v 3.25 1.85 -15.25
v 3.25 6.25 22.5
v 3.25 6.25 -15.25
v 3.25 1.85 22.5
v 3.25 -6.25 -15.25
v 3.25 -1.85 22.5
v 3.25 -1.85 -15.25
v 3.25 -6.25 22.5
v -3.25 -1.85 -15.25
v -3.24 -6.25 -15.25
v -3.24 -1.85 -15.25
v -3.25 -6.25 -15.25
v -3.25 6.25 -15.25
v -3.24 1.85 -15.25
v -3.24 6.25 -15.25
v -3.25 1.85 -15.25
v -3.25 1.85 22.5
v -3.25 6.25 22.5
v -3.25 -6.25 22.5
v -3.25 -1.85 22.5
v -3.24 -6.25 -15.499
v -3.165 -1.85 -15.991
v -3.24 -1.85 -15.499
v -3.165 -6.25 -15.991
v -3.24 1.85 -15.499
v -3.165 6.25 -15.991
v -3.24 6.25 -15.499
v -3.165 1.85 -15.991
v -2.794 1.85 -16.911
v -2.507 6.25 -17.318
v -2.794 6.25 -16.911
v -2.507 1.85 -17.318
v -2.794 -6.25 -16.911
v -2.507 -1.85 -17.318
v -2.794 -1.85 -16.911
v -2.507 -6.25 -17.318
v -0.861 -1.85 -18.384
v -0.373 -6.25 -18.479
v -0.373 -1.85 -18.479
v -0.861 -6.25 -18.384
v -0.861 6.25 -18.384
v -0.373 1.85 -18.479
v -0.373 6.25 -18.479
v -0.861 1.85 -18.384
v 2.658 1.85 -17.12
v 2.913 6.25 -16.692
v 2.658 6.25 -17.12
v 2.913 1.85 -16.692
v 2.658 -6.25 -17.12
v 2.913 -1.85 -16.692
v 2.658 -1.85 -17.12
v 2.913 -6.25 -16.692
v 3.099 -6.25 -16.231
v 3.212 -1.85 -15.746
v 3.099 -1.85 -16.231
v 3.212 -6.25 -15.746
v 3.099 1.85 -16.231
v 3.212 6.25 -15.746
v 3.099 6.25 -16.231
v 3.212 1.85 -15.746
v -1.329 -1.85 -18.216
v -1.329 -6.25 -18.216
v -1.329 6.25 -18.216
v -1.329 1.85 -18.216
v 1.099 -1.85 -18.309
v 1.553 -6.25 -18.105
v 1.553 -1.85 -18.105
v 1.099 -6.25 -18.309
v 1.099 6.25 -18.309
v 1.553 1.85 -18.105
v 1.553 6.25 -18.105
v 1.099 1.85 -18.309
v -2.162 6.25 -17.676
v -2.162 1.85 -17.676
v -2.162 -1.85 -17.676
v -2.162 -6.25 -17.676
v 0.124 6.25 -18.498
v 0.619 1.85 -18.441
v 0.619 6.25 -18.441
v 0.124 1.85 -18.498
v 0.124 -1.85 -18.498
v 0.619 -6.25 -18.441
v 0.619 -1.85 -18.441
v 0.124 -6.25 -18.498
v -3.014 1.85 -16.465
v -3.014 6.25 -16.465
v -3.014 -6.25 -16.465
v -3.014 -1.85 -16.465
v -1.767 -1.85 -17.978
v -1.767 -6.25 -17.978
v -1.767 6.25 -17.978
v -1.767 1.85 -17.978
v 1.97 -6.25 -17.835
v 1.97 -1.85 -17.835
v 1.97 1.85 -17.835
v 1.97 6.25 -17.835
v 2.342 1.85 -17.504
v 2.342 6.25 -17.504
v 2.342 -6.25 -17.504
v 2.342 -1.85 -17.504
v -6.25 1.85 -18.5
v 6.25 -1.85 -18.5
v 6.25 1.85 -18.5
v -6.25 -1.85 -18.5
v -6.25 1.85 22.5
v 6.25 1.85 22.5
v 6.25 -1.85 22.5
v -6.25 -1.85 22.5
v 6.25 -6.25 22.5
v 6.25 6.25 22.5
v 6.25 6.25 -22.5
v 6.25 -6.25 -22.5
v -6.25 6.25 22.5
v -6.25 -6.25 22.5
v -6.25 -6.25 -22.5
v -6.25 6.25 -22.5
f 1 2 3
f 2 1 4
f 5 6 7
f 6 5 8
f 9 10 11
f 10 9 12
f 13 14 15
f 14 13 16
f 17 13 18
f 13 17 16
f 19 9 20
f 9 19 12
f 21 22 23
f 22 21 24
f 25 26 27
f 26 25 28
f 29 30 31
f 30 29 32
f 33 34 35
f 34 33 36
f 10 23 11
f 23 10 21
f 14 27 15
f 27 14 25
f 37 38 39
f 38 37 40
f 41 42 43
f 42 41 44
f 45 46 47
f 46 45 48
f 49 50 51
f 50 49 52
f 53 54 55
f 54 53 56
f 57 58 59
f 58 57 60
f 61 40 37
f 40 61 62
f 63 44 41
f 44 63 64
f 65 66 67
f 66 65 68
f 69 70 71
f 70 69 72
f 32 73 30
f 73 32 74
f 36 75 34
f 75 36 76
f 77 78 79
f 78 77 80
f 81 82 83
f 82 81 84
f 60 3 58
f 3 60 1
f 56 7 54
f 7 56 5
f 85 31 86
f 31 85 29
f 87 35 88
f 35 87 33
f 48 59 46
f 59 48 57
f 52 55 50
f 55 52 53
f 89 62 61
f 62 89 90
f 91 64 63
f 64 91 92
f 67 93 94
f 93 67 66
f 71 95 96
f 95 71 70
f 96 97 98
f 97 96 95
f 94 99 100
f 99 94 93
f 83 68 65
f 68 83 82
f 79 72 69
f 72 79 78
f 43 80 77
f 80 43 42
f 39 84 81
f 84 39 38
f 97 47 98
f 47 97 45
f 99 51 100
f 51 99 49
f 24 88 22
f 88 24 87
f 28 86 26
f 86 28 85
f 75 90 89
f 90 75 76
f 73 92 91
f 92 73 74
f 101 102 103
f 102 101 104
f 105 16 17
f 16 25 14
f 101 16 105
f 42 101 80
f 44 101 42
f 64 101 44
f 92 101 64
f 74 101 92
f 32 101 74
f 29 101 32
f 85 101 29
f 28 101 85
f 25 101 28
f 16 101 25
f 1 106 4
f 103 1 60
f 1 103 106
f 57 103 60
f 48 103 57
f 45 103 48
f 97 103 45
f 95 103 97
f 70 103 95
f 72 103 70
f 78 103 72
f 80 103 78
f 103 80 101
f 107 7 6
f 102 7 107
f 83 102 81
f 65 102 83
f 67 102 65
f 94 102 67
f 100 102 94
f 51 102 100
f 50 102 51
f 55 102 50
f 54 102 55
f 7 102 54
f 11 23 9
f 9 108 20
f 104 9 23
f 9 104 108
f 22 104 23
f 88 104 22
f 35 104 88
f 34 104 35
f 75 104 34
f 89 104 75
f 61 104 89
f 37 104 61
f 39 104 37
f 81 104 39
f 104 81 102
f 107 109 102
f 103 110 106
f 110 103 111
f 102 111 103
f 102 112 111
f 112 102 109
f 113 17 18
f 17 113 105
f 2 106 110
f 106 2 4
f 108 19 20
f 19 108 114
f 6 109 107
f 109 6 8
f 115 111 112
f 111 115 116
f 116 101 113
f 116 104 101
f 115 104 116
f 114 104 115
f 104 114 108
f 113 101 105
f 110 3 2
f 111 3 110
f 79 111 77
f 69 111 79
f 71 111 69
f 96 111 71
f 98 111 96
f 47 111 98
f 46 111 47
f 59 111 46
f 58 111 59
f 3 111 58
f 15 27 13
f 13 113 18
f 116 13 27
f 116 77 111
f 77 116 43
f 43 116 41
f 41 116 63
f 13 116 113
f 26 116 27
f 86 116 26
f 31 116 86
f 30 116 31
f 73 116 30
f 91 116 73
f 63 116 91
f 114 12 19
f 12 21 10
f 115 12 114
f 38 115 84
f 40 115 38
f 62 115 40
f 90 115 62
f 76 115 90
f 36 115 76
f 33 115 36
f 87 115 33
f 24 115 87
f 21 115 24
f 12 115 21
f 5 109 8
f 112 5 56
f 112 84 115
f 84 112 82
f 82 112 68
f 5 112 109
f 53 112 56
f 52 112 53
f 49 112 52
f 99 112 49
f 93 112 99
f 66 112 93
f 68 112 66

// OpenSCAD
//design and code by emanresu (http://www.thingiverse.com/Emanresu)


//CUSTOMIZER VARIABLES

//cuvette adaptor width (mm)
adaptor_x=12.5;
//cuvette adaptor length (in beampath dimention) (mm)
adaptor_y=12.5;
//cuvette adaptor height (mm)
adaptor_z=45;
//thickness of material at the base of the adaptor (mm)
bottom_thick=4;
//width of adaptor window (mm)
adaptor_window_width=6.5;
//outer thickness of cuvette in beampath dimention (assumes cuvette is full width of adaptor)
cuvette_y=3.7;

/* [Hidden] */

//Set openSCAD resolution
$fa=1;
$fs=0.5;


  /////////////
 // Modules //
/////////////

module holder_body() {
	// body...
	cube(size=[adaptor_x, adaptor_y, adaptor_z], center=true);
}

module adaptor_window_width() {
	// body...
	translate([0, 0, adaptor_window_width/2]) {
		cube(size=[adaptor_window_width, adaptor_y+1, adaptor_z], center=true);
	}
	translate([0, 0, -(adaptor_z-adaptor_window_width)/2]) {
		rotate([90, 00, 00]) {
			cylinder(r=adaptor_window_width/2, h=adaptor_y+1, center=true);
		}
	}	
}

module cuvette_cutout() {
	// body...
	cube(size=[adaptor_x+1, cuvette_y, adaptor_z], center=true);
}


  //////////////////
 // Control Code //
//////////////////

difference() {
	holder_body();
	translate([0, 0, bottom_thick]) {
		adaptor_window_width();
		cuvette_cutout();
	}
}
